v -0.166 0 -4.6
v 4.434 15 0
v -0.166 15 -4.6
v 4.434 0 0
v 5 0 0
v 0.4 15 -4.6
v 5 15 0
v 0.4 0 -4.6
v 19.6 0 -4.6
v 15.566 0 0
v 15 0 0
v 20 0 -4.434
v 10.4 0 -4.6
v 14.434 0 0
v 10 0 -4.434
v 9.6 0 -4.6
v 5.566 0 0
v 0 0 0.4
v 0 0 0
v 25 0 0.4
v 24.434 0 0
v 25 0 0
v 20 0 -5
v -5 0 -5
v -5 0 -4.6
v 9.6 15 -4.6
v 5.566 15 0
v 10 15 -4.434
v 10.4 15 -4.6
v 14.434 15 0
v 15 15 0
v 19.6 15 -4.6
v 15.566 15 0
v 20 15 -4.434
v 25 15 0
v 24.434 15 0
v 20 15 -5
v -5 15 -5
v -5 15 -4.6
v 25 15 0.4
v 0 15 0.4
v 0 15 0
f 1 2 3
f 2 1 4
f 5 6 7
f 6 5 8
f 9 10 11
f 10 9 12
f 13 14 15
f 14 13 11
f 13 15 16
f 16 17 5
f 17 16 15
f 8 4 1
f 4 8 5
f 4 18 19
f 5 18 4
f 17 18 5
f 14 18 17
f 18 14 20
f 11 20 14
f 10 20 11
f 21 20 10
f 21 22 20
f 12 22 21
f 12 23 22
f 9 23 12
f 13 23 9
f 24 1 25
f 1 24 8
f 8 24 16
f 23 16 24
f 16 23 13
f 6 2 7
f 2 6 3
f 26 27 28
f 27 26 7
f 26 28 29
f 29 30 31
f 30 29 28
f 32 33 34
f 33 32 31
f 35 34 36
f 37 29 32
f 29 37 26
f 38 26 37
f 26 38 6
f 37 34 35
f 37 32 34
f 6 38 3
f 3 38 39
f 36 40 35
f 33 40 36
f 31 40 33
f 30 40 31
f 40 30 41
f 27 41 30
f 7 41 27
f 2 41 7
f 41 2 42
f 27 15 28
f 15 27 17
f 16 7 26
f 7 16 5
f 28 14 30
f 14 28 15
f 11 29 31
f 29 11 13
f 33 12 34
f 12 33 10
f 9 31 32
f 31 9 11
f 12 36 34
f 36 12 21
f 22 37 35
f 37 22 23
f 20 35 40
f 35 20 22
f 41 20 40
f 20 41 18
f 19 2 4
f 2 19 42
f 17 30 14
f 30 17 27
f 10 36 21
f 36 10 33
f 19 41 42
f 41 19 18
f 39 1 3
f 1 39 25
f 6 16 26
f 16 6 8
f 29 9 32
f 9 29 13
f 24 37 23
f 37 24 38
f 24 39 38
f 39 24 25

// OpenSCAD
length = 25;
width = 15;
height = 5;
thickness = 0.4;

module cableHolder(length, width, height) {
    cube([length, width, thickness]);

    translate([-height, 0, -height])
        cube([length, width, thickness]);
    
    ribSegments = floor((length-height) / height);
    for (iteration = [0:ribSegments]) {
        ribLength =  height / sin(45);
        signedness = (iteration % 2 == 1) ? -1 : 1;
        translate([iteration * height, 0, height * (iteration % 2) - height])
            rotate([0, -45 * signedness, 0])
            cube([ribLength, width, thickness]);
    }
    
}

cableHolder(length, width, height);
